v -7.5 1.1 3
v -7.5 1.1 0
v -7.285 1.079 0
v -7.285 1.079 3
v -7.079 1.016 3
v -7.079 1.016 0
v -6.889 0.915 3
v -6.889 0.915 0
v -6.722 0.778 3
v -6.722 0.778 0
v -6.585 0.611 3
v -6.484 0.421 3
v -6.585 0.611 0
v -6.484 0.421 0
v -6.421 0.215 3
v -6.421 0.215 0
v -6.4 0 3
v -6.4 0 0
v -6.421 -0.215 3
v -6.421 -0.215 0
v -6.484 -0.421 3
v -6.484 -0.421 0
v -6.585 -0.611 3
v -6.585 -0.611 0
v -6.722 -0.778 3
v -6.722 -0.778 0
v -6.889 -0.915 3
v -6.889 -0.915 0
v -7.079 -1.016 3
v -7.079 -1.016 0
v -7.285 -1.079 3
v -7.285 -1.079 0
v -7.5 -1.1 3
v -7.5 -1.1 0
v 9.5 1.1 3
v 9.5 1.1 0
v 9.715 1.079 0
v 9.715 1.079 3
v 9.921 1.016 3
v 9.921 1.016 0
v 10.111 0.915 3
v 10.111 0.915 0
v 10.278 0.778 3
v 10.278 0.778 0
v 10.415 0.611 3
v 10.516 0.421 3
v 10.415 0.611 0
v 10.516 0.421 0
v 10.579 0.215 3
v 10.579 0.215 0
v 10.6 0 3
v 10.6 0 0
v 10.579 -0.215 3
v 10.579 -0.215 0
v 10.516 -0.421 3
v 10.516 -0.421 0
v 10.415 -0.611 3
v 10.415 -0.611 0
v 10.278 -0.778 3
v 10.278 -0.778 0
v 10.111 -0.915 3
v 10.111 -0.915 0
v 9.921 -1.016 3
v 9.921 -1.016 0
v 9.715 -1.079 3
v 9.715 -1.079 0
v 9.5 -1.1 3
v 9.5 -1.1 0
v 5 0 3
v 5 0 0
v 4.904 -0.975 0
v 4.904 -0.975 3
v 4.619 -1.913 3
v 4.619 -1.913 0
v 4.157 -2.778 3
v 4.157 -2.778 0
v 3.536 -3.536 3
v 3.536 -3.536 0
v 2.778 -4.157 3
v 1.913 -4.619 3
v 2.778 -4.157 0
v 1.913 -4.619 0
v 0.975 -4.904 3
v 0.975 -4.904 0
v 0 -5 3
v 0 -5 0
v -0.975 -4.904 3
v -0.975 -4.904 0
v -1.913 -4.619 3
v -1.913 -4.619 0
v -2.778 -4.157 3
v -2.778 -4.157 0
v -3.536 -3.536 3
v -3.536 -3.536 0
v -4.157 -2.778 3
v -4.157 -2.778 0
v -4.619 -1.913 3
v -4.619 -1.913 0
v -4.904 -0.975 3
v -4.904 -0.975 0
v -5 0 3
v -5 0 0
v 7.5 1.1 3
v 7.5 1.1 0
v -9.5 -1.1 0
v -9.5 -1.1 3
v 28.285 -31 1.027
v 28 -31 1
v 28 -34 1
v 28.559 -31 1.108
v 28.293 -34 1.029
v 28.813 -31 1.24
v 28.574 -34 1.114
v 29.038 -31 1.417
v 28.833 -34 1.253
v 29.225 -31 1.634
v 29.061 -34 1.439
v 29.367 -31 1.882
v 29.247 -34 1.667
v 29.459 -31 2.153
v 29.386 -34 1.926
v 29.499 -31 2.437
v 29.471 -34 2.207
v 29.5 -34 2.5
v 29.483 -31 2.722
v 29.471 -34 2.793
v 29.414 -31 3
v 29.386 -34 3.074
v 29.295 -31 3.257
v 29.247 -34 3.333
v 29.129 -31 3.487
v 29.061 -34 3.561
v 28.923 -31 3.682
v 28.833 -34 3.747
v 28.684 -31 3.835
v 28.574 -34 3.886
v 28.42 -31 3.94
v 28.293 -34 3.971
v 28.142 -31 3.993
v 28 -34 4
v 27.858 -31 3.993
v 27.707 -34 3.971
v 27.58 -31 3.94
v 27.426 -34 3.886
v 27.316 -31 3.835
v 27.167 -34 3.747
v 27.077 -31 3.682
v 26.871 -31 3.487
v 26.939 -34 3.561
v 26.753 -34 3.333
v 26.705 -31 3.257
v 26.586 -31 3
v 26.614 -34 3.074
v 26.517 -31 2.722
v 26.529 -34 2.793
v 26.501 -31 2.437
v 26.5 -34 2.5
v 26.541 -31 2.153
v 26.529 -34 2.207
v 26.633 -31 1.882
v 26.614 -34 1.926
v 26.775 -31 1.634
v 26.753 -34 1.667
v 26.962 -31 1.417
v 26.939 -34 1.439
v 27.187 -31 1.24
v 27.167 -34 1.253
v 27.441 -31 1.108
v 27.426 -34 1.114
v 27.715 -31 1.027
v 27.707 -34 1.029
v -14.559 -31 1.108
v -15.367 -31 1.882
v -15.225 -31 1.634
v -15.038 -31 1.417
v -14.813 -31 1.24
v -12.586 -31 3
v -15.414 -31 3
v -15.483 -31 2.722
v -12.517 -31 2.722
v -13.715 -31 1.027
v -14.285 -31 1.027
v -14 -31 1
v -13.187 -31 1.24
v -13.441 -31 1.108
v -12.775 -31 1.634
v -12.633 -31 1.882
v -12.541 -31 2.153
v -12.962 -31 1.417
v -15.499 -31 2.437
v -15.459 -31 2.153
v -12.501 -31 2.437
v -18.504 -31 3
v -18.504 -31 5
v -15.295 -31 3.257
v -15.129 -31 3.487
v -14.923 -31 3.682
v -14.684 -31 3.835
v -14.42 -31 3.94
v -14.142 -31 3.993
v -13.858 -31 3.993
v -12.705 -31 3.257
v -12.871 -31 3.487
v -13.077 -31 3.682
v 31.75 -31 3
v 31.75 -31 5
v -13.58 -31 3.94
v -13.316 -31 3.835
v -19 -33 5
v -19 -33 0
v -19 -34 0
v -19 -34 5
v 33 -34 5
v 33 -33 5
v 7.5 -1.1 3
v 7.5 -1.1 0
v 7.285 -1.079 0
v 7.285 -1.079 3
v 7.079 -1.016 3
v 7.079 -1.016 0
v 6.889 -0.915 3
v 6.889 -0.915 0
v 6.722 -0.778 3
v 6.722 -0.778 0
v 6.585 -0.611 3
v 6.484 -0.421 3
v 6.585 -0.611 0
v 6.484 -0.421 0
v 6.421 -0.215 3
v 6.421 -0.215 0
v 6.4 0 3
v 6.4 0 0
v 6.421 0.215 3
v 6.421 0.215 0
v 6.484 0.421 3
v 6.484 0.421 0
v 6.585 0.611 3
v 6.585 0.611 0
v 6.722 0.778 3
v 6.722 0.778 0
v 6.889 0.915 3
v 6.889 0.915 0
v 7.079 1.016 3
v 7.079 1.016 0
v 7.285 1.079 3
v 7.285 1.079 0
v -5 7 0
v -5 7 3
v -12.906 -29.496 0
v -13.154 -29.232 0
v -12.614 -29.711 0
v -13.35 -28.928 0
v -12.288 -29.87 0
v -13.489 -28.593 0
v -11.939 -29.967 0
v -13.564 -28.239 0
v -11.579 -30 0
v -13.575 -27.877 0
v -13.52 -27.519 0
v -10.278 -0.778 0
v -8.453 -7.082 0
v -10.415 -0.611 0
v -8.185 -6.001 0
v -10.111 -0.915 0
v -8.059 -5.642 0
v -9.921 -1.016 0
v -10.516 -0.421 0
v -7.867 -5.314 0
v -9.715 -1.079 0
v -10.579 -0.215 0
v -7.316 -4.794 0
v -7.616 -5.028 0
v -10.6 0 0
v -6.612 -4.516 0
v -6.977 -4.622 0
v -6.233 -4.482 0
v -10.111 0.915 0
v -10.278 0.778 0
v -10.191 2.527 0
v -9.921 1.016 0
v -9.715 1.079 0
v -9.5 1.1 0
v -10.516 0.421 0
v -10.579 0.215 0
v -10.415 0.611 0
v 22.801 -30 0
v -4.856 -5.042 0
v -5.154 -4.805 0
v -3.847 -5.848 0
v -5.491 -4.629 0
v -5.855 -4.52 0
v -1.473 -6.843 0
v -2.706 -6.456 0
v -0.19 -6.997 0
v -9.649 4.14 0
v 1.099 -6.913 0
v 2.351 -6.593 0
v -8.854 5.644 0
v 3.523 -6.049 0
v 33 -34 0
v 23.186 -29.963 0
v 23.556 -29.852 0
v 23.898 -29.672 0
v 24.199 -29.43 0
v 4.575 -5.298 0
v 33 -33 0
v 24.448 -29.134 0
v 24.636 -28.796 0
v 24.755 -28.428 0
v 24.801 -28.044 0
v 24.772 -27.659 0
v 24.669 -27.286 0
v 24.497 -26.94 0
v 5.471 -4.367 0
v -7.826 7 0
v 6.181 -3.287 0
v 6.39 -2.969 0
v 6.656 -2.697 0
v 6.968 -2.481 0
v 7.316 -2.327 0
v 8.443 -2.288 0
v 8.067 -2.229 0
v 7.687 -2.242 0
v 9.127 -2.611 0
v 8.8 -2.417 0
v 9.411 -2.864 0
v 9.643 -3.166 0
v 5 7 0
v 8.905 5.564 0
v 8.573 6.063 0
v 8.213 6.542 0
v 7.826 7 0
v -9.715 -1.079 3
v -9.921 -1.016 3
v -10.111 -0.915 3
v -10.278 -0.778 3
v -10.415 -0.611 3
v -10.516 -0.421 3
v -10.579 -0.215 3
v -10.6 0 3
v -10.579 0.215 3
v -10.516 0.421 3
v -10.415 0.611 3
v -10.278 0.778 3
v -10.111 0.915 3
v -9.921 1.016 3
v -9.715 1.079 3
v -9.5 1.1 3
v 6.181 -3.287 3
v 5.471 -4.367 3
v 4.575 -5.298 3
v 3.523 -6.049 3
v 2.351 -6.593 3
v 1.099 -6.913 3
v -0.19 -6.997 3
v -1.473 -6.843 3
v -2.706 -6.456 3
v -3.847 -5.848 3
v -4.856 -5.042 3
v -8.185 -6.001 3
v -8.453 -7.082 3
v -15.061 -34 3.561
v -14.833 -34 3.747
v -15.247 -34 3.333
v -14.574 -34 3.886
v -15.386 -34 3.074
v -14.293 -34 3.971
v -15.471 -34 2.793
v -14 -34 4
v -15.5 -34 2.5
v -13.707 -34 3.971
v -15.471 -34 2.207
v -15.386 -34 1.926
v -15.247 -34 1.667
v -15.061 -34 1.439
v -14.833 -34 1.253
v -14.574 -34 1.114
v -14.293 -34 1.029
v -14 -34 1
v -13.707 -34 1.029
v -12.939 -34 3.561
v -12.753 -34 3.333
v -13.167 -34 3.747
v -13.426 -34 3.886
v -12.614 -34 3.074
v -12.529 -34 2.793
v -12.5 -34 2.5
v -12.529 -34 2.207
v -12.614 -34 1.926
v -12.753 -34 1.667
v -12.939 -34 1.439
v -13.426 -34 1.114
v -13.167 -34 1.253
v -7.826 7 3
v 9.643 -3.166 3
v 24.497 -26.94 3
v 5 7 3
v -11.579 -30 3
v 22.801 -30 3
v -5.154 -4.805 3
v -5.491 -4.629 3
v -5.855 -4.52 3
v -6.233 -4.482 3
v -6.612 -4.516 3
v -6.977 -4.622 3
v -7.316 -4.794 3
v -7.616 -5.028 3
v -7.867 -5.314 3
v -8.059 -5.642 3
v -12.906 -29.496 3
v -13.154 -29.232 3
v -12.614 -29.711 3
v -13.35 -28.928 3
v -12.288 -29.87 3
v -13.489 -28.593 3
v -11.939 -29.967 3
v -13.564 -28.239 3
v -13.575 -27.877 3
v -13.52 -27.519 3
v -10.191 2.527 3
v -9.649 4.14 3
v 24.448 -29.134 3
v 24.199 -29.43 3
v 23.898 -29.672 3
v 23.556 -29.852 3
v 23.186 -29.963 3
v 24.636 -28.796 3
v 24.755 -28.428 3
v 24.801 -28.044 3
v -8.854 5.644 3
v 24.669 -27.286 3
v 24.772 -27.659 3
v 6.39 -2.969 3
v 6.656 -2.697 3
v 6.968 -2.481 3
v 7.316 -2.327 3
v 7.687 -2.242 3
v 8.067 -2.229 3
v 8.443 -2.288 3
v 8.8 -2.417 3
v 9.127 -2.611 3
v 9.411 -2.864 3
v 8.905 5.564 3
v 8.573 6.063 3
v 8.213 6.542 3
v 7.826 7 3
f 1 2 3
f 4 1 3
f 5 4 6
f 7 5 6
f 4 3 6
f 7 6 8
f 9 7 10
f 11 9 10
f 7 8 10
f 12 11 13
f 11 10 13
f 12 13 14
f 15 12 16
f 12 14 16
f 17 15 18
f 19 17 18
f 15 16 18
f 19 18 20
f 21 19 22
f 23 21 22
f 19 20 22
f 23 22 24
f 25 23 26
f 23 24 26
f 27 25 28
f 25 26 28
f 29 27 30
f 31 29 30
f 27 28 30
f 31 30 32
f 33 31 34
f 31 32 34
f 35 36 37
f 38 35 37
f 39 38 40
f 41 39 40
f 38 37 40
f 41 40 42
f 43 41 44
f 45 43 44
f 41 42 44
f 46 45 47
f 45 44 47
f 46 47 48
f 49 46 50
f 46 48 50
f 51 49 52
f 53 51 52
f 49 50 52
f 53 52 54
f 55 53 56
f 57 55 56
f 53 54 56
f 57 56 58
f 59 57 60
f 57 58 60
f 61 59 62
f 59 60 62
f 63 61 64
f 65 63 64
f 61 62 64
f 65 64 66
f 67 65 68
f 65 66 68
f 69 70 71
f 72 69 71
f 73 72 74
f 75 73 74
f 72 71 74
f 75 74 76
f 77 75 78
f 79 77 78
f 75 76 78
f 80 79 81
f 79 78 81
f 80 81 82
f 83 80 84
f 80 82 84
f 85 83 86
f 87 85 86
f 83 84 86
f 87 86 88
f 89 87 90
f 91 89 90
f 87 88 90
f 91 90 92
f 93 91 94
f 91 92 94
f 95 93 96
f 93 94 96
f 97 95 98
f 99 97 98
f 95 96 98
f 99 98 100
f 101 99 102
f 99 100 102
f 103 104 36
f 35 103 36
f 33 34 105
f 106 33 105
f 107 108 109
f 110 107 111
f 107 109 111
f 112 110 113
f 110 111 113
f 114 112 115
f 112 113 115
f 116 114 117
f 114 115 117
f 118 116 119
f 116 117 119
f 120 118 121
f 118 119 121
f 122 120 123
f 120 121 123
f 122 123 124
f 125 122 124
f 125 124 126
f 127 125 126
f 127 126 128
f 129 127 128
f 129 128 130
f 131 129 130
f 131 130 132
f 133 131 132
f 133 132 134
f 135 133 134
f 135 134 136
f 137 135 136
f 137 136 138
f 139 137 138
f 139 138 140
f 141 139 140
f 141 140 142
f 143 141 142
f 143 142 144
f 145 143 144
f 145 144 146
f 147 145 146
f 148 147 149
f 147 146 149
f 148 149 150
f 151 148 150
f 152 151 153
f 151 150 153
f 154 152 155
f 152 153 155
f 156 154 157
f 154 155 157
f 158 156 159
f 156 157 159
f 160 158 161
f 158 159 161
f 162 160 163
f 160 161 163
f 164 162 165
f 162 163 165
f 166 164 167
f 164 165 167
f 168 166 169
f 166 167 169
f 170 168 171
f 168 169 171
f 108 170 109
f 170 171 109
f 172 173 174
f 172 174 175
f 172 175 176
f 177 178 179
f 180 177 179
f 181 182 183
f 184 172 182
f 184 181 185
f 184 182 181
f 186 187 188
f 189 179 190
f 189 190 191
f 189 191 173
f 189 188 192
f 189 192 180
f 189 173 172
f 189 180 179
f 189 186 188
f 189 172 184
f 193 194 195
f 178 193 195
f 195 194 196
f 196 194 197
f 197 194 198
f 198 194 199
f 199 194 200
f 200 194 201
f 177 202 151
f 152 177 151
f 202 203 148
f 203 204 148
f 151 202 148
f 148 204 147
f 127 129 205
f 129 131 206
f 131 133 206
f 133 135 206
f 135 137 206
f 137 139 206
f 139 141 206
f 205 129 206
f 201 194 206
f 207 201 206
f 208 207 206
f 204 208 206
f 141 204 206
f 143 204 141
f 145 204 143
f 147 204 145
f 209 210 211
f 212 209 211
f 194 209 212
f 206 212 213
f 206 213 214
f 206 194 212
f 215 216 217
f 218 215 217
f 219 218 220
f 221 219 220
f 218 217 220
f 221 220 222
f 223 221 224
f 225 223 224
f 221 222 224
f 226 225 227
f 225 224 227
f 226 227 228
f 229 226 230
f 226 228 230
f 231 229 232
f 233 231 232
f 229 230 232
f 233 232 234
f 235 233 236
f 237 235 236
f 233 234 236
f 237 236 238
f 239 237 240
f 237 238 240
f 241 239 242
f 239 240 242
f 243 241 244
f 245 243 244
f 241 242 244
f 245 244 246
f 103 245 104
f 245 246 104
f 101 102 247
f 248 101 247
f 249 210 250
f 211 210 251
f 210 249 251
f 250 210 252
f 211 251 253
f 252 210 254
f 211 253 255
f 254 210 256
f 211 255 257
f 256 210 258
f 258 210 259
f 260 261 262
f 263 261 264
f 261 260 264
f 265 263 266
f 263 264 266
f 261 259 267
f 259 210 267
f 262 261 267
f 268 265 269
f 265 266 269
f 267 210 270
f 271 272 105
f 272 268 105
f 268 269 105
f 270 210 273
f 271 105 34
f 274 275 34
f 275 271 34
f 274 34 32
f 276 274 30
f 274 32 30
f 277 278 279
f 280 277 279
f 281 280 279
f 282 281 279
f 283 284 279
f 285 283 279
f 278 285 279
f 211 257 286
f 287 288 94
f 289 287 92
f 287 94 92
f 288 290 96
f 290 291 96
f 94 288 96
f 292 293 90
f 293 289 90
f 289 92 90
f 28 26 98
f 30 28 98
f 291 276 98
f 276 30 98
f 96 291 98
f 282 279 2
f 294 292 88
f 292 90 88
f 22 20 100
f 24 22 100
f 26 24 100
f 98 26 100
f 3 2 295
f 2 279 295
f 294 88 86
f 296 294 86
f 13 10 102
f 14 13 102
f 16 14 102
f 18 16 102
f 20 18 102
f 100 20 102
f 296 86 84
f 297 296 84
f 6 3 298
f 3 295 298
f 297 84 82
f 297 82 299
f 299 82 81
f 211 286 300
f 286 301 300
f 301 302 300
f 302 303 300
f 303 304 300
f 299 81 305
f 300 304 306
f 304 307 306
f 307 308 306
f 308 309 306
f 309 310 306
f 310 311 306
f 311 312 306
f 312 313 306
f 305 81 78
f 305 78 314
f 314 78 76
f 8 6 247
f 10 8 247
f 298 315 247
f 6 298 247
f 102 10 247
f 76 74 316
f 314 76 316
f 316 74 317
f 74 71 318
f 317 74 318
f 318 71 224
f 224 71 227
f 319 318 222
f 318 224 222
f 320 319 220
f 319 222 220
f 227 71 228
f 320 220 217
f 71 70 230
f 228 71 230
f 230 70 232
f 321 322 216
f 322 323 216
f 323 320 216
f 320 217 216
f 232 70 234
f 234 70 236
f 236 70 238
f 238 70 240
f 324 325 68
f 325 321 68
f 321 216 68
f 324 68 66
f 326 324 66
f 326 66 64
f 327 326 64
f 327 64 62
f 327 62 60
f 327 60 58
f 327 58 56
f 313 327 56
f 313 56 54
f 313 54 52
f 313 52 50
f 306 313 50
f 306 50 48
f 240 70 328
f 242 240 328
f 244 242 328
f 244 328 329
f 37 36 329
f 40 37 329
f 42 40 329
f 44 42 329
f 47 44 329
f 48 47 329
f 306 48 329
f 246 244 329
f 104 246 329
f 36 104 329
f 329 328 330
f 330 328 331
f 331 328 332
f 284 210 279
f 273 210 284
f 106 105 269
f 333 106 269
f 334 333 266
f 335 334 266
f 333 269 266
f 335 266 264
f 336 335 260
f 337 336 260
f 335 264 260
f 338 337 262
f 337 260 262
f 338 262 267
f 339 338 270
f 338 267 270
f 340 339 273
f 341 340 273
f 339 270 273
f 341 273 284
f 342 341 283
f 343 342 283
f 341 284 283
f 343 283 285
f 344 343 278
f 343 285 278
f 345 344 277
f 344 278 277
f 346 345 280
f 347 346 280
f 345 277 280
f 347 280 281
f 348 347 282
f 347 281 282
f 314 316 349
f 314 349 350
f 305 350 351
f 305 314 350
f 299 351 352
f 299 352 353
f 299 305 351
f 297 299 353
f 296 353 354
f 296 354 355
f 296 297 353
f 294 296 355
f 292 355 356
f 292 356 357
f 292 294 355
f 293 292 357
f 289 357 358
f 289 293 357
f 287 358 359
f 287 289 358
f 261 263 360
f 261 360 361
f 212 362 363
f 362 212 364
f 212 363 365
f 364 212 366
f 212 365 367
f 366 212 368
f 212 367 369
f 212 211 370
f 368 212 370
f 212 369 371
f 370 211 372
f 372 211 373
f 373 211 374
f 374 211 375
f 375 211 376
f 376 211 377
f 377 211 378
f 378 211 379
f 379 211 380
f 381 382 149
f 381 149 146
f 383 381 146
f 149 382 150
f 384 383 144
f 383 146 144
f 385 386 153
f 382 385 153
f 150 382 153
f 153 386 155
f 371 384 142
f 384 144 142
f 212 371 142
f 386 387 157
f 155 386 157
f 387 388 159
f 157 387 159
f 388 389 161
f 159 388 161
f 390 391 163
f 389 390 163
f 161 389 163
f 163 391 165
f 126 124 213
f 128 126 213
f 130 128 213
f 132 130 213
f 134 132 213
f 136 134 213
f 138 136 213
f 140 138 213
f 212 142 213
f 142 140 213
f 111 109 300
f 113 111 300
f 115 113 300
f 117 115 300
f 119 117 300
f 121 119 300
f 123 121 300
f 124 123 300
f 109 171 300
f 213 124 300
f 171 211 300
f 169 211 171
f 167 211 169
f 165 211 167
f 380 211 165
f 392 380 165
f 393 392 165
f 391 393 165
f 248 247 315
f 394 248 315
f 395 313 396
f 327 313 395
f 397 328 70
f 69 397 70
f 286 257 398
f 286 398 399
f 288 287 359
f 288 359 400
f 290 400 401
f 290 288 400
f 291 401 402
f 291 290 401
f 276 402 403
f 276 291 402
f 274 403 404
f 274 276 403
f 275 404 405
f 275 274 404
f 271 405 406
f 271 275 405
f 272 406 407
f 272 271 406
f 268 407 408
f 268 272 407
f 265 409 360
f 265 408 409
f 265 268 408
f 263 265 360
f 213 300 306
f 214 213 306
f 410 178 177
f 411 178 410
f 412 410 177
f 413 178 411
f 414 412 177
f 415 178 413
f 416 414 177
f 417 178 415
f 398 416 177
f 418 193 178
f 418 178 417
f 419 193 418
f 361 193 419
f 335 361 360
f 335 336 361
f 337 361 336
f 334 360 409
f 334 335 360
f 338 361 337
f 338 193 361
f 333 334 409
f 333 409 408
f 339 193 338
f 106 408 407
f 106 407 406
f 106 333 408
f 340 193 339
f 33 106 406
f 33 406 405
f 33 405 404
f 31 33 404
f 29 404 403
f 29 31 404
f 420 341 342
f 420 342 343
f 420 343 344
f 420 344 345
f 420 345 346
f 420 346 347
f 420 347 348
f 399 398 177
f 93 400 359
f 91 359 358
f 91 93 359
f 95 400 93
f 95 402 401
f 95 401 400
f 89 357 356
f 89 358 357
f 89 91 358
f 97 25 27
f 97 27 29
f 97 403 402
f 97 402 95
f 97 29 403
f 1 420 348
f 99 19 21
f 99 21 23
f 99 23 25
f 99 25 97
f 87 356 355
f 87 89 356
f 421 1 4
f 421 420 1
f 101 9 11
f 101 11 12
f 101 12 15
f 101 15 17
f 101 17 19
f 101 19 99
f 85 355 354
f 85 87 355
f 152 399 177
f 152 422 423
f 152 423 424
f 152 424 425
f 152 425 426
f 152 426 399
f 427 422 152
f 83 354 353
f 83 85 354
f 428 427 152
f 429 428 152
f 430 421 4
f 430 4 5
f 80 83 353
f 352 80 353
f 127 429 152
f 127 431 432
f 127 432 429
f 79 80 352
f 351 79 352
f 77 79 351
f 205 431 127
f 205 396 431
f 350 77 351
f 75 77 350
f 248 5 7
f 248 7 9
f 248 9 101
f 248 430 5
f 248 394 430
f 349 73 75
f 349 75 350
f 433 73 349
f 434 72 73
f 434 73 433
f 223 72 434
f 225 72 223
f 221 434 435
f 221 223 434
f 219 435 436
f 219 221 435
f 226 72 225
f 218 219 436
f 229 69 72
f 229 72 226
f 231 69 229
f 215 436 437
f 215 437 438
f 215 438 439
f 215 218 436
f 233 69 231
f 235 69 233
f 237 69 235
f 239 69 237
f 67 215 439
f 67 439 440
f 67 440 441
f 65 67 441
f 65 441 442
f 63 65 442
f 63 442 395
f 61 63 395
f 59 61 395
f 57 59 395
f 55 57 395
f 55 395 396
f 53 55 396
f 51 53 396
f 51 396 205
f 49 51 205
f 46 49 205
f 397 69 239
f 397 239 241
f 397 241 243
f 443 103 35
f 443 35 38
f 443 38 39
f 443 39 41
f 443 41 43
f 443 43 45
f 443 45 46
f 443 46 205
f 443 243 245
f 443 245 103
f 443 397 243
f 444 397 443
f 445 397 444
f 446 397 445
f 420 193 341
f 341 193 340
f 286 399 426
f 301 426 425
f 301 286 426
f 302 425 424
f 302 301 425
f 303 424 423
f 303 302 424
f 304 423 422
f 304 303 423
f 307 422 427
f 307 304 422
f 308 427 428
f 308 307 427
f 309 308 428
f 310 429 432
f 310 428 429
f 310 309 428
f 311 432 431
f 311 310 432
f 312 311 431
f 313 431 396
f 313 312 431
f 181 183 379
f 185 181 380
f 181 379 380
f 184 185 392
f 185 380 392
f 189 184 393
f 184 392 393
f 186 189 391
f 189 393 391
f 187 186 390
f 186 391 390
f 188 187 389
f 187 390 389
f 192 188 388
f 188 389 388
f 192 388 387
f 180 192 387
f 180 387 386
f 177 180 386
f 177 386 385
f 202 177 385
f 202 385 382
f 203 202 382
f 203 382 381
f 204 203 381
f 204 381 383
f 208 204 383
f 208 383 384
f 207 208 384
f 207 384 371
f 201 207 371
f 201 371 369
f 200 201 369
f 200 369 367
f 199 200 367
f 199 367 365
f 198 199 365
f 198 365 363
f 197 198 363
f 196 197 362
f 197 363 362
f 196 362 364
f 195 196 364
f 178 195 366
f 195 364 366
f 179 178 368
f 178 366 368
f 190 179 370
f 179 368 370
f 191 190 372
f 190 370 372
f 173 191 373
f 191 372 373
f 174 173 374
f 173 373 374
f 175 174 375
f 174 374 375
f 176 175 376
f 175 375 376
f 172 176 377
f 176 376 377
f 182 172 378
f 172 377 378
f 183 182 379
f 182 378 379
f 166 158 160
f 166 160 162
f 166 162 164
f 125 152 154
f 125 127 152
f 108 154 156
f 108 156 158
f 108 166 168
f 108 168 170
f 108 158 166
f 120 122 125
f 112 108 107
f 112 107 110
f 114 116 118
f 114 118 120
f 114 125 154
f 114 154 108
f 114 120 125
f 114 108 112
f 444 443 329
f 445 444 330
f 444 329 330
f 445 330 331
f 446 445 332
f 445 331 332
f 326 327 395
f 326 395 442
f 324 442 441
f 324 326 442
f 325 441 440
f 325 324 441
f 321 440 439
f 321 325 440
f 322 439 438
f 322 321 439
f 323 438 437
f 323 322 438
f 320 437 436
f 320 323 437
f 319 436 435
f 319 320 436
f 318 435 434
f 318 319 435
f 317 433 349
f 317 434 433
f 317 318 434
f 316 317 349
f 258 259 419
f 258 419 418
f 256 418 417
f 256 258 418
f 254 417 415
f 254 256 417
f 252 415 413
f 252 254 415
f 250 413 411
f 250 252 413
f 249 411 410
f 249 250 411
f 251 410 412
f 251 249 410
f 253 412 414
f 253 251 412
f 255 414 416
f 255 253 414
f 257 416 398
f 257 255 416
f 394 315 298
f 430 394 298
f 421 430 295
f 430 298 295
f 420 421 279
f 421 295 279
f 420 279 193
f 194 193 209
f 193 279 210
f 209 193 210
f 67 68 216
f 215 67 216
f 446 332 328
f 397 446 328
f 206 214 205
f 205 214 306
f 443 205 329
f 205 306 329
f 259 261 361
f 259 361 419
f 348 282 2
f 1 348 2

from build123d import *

# Parameters (mm, degrees)
EXTRUDE_1_DEPTH     = 5
SKETCH_2_W          = 105.590665855
SKETCH_2_H          = 53.734325109
CUT_EXTRUDE_1_DEPTH = 2
SKETCH_4_R          = 1.5
CUT_EXTRUDE_2_DEPTH = 3


with BuildPart() as part:
    # 草图1 → 凸台-拉伸1 (new body)
    with BuildSketch(Plane.XY):
        with BuildLine():
            Line((-10.191413347, 2.526874351), (-19, -33))
            Line((-19, -33), (-19, -34))
            Line((-19, -34), (33, -34))
            Line((33, -34), (33, -33))
            Line((33, -33), (8.904718959, 5.563809869))
            ThreePointArc((8.904718959, 5.563809869), (8.396242616, 6.305006736), (7.826237921, 7))
            Line((7.826237921, 7), (5, 7))
            Line((5, 7), (5, 0))
            ThreePointArc((5, 0), (0, -5), (-5, 0))
            Line((-5, 0), (-5, 7))
            Line((-5, 7), (-7.826237921, 7))
            ThreePointArc((-7.826237921, 7), (-9.282303193, 4.908039061), (-10.191413347, 2.526874351))
        make_face()
        with BuildLine():
            Line((-8.452697078, -7.081843943), (-13.519839571, -27.5186906))
            ThreePointArc((-13.519839571, -27.5186906), (-13.153835237, -29.232351654), (-11.578617982, -30))
            Line((-11.578617982, -30), (22.801020138, -30))
            ThreePointArc((22.801020138, -30), (24.55024091, -28.969652872), (24.497157083, -26.940226692))
            Line((24.497157083, -26.940226692), (9.642502803, -3.165776319))
            ThreePointArc((9.642502803, -3.165776319), (7.876643723, -2.22676529), (6.180506778, -3.286538599))
            ThreePointArc((6.180506778, -3.286538599), (1.099422059, -6.91312311), (-4.856029369, -5.041723789))
            ThreePointArc((-4.856029369, -5.041723789), (-6.797250959, -4.560414389), (-8.184687922, -6.0009069))
            Line((-8.184687922, -6.0009069), (-8.452697078, -7.081843943))
        make_face(mode=Mode.SUBTRACT)
        with BuildLine():
            Line((-9.5, 1.1), (-7.5, 1.1))
            ThreePointArc((-7.5, 1.1), (-6.4, 0), (-7.5, -1.1))
            Line((-7.5, -1.1), (-9.5, -1.1))
            ThreePointArc((-9.5, -1.1), (-10.6, 0), (-9.5, 1.1))
        make_face(mode=Mode.SUBTRACT)
        with BuildLine():
            Line((9.5, -1.1), (7.5, -1.1))
            ThreePointArc((7.5, -1.1), (6.4, 0), (7.5, 1.1))
            Line((7.5, 1.1), (9.5, 1.1))
            ThreePointArc((9.5, 1.1), (10.6, 0), (9.5, -1.1))
        make_face(mode=Mode.SUBTRACT)
    extrude(amount=EXTRUDE_1_DEPTH)

    # 草图2 → 切除-拉伸1 (cut)
    with BuildSketch(Plane.XY.offset(5)):
        with Locations((1.500851151, -4.132837446)):
            Rectangle(SKETCH_2_W, SKETCH_2_H)
    extrude(amount=-CUT_EXTRUDE_1_DEPTH, mode=Mode.SUBTRACT)

    # 草图4 → 切除-拉伸2 (cut)
    with BuildSketch(Plane(origin=(0, -34, 0), x_dir=(-1, 0, 0), z_dir=(0, -1, 0))):
        with Locations(Location((14, -2.5, 0), (0, 0, 90))):
            Circle(SKETCH_4_R)
        with Locations(Location((-28, -2.5, 0), (0, 0, 90))):
            Circle(SKETCH_4_R)
    extrude(amount=-CUT_EXTRUDE_2_DEPTH, mode=Mode.SUBTRACT)


solid = part.part
